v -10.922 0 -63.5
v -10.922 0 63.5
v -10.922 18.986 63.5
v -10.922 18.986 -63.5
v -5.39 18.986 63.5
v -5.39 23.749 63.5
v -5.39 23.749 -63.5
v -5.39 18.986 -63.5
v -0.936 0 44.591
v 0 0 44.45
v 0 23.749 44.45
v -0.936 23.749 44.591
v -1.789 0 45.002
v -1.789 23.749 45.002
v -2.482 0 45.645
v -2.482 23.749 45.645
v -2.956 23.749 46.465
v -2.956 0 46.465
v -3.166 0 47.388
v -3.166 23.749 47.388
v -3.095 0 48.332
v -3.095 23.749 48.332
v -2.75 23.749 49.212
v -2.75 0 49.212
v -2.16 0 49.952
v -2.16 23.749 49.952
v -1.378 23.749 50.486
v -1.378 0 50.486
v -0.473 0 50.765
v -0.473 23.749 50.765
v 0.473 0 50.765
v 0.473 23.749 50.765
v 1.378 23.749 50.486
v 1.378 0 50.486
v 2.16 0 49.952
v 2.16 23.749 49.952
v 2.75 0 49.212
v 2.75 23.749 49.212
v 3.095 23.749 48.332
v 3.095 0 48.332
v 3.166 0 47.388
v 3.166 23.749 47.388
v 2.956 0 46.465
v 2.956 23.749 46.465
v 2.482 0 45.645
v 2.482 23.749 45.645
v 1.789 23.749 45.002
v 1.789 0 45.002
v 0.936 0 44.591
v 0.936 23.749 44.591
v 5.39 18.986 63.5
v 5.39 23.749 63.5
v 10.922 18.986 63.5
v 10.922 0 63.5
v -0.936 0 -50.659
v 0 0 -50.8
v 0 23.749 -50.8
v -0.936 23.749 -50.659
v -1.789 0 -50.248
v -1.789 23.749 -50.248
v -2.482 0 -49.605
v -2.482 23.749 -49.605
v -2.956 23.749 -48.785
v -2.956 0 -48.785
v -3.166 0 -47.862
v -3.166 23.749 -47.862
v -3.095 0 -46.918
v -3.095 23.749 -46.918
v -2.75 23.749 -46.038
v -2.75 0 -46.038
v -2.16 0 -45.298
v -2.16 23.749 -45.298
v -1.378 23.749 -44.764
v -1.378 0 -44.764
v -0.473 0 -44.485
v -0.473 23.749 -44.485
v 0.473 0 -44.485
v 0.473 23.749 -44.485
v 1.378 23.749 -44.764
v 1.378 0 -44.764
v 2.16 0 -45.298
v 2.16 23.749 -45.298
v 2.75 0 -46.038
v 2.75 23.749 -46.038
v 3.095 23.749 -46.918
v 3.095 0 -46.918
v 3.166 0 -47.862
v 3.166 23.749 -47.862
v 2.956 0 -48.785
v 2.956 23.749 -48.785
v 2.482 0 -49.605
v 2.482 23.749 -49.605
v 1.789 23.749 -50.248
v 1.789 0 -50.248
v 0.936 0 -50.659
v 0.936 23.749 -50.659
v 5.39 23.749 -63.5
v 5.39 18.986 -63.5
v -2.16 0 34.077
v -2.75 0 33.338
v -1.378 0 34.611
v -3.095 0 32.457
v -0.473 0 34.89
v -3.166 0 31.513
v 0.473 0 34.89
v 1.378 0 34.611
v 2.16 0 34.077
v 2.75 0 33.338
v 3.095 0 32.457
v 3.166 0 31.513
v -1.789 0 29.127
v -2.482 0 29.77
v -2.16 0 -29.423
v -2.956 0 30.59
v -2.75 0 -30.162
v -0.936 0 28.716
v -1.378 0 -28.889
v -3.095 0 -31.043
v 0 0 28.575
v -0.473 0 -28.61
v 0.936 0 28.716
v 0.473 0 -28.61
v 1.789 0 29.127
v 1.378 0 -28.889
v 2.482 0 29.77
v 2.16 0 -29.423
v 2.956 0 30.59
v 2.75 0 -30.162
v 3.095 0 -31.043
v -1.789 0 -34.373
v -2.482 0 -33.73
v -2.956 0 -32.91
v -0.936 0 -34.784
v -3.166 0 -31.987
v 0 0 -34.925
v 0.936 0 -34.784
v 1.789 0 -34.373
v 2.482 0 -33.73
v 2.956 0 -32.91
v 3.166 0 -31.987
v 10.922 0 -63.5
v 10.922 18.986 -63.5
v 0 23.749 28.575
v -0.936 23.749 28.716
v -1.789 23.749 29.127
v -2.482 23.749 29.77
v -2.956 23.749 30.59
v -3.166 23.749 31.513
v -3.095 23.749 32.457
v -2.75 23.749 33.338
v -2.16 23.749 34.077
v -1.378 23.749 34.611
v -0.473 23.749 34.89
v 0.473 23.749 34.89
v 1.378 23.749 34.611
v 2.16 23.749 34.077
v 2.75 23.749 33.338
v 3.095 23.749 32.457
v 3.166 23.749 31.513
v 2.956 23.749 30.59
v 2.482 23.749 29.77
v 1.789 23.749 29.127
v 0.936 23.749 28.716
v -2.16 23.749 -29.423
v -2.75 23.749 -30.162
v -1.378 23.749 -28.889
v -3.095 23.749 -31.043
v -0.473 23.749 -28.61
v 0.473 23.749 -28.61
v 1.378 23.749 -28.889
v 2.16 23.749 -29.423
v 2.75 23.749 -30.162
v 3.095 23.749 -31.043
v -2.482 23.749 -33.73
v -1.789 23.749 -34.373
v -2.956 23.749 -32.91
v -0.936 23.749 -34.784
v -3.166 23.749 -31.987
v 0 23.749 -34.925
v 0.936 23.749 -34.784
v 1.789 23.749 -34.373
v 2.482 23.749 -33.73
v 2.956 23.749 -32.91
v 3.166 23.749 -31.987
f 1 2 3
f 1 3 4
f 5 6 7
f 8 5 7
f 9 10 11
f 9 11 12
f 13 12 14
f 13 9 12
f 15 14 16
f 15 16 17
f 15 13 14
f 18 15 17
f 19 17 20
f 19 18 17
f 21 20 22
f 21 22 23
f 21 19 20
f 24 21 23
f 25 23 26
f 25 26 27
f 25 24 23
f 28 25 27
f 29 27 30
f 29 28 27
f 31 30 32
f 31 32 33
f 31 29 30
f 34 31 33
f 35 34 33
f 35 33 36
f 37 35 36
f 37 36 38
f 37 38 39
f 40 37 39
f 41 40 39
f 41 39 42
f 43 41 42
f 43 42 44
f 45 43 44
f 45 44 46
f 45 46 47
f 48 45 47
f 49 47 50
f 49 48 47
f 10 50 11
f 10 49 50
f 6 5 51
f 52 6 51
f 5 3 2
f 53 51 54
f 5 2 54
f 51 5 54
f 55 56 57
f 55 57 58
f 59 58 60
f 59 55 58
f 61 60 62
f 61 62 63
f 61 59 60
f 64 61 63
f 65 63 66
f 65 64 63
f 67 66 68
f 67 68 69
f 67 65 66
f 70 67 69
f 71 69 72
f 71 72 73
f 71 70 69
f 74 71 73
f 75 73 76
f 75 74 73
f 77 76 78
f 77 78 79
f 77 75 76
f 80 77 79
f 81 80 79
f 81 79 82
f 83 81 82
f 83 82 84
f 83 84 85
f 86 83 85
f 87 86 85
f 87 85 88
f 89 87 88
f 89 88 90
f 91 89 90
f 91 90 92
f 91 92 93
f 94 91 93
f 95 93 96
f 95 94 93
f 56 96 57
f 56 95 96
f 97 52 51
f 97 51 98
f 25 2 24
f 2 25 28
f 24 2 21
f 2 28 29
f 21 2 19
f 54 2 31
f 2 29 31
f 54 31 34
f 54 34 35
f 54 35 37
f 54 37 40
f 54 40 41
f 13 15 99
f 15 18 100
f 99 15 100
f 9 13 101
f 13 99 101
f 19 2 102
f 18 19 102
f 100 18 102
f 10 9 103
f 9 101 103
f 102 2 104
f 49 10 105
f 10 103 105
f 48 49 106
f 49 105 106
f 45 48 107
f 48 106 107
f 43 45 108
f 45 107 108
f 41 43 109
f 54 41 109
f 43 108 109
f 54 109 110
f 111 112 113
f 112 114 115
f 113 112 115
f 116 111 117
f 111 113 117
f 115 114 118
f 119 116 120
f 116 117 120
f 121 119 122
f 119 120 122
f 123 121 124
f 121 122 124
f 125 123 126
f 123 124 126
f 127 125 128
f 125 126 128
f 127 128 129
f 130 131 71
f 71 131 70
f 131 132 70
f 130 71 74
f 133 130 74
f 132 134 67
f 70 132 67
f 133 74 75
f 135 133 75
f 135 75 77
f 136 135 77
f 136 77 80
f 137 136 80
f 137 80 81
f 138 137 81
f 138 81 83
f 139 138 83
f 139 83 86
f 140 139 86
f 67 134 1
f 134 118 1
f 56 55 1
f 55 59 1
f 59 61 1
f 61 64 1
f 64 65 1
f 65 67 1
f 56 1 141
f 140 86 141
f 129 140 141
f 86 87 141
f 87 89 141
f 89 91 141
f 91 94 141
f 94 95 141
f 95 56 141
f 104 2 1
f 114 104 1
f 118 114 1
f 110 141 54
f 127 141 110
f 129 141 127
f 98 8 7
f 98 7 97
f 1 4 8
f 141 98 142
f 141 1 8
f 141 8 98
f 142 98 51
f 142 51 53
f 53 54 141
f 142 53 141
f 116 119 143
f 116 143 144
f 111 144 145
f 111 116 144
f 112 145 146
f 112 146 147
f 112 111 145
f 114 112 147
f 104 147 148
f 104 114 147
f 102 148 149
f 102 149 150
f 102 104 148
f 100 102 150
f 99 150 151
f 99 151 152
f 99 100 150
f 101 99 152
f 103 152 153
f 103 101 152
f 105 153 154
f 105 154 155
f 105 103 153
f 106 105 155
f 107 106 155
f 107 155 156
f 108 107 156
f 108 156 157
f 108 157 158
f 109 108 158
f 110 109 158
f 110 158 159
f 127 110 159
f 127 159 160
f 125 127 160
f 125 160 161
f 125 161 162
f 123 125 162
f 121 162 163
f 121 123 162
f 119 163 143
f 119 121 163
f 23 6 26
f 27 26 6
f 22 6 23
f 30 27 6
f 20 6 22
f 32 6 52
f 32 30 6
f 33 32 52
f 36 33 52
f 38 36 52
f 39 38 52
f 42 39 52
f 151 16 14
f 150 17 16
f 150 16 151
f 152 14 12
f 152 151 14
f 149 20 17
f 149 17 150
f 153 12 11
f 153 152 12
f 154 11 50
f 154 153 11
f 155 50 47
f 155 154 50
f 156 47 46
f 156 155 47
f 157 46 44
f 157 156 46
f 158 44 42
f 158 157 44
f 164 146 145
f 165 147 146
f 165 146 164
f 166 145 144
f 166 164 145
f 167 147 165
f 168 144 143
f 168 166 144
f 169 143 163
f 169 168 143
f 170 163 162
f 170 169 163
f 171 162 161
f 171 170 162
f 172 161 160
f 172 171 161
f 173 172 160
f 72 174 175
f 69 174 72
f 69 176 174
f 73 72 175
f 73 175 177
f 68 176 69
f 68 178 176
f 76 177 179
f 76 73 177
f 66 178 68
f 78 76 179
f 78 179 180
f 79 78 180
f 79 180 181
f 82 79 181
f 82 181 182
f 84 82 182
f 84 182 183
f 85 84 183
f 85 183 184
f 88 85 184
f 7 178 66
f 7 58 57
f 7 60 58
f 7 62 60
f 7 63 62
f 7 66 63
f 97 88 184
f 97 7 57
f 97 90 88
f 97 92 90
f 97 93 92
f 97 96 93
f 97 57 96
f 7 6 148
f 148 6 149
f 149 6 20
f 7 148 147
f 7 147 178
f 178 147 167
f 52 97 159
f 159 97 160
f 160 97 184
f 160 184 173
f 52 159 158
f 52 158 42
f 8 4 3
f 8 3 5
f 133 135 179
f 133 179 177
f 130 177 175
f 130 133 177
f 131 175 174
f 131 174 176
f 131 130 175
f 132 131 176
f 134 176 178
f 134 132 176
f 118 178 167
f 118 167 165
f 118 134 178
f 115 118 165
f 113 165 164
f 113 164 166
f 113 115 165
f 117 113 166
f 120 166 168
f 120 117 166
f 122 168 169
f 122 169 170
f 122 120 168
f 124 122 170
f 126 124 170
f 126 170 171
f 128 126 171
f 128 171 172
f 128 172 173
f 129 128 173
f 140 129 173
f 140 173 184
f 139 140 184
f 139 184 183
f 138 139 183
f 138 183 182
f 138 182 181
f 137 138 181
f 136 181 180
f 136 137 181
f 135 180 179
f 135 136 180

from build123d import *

# Parameters (mm, degrees)
SKETCH1_W           = 21.844
SKETCH1_H           = 127
SKETCH1_R           = 3.175
BOSS_EXTRUDE1_DEPTH = 23.749
SKETCH3_W           = 5.531865031
SKETCH3_H           = 127
CUT_EXTRUDE2_DEPTH  = 4.7625


with BuildPart() as part:
    # Sketch1 → Boss-Extrude1 (new body)
    with BuildSketch(Plane(origin=(0, 0, 0), x_dir=(1, 0, 0), z_dir=(0, 1, 0))):
        Rectangle(SKETCH1_W, SKETCH1_H)
        with Locations(Location((0, 31.75, 0), (0, 0, 90))):
            Circle(SKETCH1_R, mode=Mode.SUBTRACT)
        with Locations(Location((0, 47.625, 0), (0, 0, 90))):
            Circle(SKETCH1_R, mode=Mode.SUBTRACT)
        with Locations(Location((0, -31.75, 0), (0, 0, 90))):
            Circle(SKETCH1_R, mode=Mode.SUBTRACT)
        with Locations(Location((0, -47.625, 0), (0, 0, 90))):
            Circle(SKETCH1_R, mode=Mode.SUBTRACT)
    extrude(amount=BOSS_EXTRUDE1_DEPTH)

    # Sketch3 → Cut-Extrude2 (cut)
    with BuildSketch(Plane(origin=(0, 23.749, 0), x_dir=(1, 0, 0), z_dir=(0, 1, 0))):
        with Locations((-8.156067484, 0)):
            Rectangle(SKETCH3_W, SKETCH3_H)
        with Locations((8.156067484, 0)):
            Rectangle(SKETCH3_W, SKETCH3_H)
    extrude(amount=-CUT_EXTRUDE2_DEPTH, mode=Mode.SUBTRACT)


solid = part.part
